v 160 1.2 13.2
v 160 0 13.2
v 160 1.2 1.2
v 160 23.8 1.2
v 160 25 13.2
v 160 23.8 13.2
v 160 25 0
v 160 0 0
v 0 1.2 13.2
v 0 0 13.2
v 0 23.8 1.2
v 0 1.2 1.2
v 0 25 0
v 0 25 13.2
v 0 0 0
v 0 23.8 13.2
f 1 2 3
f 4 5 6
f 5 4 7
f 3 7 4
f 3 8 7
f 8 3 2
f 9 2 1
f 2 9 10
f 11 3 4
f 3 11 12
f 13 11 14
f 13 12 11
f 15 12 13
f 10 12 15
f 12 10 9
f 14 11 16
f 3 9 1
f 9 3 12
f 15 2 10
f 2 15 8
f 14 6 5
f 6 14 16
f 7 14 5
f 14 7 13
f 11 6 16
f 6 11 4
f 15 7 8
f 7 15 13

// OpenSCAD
// ScienceClaw nominal U-channel. All dimensions in millimeters.
// Clamp the first clamp_length along x. No holes or clamp reinforcement.
// Print parameters, layer orientation, material batch, and actual dimensions
// must be recorded separately; this file does not prescribe a qualified process.
length = 160;
clamp_length = 25;
base_width = 25;
wall_height = 12;
thickness = 1.2;
assert(length > clamp_length && clamp_length > 0);
assert(base_width > 2 * thickness && thickness > 0 && wall_height >= 0);
union() {
    cube([length, base_width, thickness]);
    if (wall_height > 0) {
        translate([0, 0, thickness]) cube([length, thickness, wall_height]);
        translate([0, base_width - thickness, thickness]) cube([length, thickness, wall_height]);
    }
}
